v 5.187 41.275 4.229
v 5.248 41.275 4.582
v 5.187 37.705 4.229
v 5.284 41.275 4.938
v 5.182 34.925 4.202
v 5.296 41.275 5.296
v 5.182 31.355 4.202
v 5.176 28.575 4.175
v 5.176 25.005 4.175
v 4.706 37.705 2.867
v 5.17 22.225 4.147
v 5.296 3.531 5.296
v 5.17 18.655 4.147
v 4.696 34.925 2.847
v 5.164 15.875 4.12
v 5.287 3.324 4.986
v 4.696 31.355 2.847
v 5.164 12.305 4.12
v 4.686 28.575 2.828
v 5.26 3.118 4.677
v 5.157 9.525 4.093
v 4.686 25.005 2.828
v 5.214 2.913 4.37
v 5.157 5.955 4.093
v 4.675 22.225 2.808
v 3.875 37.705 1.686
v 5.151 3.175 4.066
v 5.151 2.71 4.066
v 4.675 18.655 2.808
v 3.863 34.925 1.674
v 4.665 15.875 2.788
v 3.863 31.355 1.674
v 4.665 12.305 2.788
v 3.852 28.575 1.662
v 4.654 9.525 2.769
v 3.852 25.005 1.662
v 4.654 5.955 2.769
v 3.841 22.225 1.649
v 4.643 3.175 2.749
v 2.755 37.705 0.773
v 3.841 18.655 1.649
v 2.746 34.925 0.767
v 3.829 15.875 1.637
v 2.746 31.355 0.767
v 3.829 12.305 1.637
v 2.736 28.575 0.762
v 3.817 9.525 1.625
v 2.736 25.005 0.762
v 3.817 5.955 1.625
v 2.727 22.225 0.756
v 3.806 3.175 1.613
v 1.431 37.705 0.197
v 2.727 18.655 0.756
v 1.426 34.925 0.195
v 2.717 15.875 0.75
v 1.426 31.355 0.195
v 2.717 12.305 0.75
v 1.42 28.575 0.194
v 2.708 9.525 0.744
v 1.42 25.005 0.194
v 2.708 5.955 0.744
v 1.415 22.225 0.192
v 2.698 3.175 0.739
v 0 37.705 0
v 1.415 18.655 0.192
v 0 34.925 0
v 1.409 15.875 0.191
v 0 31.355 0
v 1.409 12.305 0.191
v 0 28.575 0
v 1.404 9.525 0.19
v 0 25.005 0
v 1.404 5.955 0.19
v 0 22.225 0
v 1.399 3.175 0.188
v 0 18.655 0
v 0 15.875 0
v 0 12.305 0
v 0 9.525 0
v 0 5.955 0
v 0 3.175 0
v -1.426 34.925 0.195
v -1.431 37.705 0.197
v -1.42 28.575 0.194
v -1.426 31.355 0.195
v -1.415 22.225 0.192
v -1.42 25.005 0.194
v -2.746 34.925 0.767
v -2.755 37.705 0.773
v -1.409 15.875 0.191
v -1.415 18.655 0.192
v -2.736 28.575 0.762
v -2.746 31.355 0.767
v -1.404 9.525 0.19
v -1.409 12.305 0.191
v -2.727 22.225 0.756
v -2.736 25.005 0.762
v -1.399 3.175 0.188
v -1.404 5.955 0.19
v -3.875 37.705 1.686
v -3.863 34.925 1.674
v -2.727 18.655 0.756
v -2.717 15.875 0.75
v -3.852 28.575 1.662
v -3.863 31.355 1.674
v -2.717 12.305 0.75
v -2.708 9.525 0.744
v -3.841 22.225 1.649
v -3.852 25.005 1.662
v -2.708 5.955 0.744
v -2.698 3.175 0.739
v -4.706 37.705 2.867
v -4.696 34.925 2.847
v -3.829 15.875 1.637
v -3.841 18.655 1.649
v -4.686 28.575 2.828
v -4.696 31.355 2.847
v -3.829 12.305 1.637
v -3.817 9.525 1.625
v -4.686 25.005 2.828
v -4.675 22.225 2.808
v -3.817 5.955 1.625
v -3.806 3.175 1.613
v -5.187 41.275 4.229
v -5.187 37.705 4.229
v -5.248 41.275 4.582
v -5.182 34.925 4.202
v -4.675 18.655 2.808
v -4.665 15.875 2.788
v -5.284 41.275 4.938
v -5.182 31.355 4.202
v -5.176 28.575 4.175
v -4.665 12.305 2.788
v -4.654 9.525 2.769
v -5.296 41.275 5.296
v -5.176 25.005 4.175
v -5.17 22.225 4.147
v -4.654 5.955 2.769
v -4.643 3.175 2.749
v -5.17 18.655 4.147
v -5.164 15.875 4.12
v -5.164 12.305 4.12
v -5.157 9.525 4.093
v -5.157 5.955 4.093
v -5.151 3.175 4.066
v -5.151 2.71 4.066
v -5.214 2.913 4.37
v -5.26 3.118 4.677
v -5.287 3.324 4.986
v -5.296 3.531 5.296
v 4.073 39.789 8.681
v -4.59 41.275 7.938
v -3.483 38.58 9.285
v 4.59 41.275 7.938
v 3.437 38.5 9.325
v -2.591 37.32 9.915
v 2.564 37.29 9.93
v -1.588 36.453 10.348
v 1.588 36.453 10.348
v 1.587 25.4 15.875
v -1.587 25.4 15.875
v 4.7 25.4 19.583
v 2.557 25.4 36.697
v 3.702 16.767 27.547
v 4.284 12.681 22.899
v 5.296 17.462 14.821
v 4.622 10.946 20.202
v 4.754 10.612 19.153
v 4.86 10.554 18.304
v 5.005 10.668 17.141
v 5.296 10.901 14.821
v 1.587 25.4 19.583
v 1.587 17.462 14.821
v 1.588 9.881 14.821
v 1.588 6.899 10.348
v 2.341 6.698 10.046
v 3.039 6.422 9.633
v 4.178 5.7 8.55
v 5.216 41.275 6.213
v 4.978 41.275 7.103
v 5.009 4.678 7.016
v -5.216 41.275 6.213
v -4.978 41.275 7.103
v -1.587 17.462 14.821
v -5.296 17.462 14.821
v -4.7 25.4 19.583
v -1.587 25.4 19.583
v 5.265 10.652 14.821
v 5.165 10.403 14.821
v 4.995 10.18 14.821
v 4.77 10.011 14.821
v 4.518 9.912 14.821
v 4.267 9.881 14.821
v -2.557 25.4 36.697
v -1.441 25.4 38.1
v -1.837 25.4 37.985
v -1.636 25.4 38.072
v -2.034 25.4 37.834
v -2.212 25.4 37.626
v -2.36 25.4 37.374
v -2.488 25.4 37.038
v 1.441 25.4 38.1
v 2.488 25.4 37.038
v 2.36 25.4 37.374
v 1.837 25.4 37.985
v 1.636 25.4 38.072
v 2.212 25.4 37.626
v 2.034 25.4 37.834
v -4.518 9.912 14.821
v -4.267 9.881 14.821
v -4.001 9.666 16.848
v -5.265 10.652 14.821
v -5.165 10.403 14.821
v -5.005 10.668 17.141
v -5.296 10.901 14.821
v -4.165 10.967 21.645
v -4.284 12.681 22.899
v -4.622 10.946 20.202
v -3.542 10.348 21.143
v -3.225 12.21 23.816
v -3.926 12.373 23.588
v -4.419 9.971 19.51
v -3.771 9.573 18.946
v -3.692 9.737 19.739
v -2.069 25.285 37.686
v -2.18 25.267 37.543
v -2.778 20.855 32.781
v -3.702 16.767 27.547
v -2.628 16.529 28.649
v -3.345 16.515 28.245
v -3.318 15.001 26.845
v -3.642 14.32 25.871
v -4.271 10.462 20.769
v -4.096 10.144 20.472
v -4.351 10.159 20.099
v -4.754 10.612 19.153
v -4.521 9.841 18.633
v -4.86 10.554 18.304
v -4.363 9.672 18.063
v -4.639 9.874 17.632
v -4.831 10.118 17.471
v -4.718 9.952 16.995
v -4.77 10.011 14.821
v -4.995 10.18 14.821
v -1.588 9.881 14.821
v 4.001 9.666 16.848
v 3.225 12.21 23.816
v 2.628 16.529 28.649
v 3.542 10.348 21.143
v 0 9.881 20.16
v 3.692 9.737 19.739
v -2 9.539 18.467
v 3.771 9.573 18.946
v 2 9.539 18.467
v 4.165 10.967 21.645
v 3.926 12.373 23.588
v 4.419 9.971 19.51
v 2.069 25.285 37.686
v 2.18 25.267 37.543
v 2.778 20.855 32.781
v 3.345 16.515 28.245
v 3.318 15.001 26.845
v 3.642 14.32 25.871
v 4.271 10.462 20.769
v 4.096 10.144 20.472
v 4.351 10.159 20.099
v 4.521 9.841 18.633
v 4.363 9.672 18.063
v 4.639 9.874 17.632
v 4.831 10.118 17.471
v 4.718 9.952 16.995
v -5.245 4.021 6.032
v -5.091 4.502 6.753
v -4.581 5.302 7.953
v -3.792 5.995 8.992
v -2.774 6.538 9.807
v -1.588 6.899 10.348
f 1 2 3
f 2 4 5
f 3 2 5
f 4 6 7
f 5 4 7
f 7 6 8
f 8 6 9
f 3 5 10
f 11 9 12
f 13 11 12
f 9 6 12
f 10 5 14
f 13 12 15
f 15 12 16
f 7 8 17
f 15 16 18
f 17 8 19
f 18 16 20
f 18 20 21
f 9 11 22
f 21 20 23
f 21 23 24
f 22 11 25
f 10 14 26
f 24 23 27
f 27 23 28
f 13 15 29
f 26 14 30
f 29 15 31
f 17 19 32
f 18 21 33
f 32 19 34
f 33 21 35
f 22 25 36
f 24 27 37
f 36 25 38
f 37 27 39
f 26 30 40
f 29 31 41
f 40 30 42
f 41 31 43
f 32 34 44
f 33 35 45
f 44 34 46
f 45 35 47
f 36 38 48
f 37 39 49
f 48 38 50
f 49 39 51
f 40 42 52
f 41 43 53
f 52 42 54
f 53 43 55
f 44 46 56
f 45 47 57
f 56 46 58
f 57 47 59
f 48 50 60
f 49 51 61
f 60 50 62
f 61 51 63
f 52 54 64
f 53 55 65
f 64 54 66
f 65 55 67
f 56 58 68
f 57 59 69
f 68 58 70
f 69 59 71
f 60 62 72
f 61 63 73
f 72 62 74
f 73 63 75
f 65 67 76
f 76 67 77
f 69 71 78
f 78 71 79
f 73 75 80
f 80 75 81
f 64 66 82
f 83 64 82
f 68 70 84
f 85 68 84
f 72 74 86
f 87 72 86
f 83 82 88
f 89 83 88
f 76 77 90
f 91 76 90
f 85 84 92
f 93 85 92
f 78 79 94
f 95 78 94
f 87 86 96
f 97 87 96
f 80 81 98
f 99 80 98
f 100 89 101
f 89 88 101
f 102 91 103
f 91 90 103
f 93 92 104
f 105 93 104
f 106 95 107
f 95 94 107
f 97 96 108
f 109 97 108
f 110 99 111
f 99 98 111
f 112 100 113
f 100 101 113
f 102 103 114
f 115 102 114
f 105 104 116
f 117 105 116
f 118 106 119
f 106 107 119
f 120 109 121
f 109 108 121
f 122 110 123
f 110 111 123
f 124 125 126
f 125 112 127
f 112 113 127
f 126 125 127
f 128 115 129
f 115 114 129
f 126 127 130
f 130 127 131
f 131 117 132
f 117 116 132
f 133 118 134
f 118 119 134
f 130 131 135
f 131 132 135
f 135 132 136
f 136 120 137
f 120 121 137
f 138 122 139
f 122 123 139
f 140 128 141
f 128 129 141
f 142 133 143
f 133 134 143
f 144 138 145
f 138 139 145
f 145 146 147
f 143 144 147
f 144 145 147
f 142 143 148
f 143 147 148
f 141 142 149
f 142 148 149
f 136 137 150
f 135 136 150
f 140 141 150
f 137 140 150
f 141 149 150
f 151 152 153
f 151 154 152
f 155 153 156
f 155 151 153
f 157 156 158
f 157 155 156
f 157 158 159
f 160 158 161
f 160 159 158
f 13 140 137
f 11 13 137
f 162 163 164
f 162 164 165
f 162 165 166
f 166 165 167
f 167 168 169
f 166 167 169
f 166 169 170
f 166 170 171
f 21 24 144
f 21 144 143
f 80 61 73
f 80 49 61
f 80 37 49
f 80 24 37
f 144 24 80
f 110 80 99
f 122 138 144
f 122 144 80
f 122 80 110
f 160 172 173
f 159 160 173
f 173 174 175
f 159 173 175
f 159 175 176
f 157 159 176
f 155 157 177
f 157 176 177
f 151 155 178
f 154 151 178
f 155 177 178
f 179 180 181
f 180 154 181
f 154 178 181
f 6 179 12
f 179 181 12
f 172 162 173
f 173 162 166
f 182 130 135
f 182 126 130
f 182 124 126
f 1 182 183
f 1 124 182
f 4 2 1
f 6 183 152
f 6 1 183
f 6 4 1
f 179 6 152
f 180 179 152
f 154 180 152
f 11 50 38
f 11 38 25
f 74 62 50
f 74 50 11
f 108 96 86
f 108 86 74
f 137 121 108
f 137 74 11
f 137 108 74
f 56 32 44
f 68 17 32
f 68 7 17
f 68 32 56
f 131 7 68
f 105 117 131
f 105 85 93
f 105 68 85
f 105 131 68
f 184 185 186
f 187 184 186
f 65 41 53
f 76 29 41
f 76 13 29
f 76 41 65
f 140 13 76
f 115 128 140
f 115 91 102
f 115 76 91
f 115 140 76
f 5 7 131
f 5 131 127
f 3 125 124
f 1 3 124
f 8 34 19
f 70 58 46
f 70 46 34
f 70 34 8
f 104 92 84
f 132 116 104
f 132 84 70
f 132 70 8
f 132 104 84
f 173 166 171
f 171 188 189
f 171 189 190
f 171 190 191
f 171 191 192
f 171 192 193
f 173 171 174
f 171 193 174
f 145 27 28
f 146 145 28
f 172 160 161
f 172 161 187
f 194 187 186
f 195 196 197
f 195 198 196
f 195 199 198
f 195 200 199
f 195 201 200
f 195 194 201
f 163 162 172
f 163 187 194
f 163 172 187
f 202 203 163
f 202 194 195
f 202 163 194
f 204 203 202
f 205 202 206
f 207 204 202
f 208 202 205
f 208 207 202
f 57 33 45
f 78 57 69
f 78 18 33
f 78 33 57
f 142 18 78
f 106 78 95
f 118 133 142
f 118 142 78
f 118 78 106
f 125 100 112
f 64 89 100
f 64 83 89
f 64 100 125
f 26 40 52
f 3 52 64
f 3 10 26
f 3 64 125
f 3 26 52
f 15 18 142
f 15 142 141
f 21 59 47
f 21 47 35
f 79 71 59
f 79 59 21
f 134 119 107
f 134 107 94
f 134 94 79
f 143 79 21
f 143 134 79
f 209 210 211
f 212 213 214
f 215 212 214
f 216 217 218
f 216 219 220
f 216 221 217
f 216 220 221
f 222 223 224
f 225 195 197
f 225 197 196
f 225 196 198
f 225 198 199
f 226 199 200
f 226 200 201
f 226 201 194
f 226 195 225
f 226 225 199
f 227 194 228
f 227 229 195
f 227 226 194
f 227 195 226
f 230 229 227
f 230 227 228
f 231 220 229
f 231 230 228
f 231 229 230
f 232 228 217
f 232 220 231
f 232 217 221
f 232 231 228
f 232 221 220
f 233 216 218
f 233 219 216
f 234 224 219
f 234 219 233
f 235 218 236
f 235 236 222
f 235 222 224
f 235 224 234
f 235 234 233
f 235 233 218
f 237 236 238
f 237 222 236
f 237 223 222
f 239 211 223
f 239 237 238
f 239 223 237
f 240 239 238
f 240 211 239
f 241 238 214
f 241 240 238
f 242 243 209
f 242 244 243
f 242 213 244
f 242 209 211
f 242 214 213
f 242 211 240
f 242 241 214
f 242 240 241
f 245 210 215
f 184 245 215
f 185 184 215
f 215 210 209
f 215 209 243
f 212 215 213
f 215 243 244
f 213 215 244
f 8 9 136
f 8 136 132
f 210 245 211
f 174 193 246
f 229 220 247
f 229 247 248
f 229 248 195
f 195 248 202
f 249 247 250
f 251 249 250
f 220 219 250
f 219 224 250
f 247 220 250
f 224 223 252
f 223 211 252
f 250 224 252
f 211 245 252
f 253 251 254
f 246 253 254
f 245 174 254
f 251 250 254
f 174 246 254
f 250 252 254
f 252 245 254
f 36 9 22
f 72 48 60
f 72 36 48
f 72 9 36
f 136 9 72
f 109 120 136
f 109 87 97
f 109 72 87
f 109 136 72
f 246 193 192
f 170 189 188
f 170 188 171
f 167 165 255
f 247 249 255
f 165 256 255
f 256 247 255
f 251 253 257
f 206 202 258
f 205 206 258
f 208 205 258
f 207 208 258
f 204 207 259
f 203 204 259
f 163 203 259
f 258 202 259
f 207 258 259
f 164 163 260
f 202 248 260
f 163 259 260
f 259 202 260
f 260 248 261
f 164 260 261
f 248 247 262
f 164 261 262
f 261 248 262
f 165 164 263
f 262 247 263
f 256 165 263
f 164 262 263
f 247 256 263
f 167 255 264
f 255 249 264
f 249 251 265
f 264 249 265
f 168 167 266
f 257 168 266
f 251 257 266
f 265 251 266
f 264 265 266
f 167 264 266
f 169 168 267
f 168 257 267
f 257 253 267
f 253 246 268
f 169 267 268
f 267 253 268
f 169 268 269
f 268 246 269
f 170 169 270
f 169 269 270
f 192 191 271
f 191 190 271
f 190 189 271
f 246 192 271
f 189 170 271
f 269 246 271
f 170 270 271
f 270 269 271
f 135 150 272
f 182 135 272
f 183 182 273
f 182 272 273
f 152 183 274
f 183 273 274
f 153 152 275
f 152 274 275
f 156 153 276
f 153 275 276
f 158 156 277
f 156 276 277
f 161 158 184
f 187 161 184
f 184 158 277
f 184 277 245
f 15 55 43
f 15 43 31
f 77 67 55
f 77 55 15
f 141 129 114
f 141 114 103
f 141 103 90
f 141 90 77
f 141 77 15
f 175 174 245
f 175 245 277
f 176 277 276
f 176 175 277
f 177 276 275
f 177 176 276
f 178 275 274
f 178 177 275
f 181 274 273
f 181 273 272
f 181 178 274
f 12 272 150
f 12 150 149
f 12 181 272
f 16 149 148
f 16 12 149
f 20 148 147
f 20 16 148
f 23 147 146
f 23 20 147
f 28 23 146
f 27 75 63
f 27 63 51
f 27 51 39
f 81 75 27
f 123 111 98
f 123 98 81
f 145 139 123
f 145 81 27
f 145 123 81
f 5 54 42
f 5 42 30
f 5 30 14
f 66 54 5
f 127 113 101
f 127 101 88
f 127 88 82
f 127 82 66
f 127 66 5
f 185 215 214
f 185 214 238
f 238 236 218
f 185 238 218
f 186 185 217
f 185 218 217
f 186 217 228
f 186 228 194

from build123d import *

# Parameters (mm, degrees)
F1_DEPTH  = 5.2959
F2_DEPTH  = 41.276
F4_DEPTH  = 3.7084
F12_DEPTH = 3.7084
F6_DEPTH  = 10.5918
F7_DEPTH  = 41.276
F8_W      = 3.5700032353
F8_H      = 0.1361034085
F8_H_2    = 4.0928895229
F8_H_3    = 0.1088827268
F8_H_4    = 4.1201102046
F8_H_5    = 0.0816620451
F8_H_6    = 4.1473308863
F8_H_7    = 0.0544413634
F8_H_8    = 4.174551568
F8_H_9    = 0.0272206817
F8_H_10   = 4.2017722497
F8_H_11   = 4.2289929314
F14_DEPTH = 12.7
F9_R      = 1.016


with BuildPart() as f1:
    # F0 (on Right) → F1 (new body, symmetric)
    with BuildSketch(Plane.YZ):
        Polygon((25.4, 38.1), (0, 0), (41.275, 0), (41.275, 7.9375), (25.4, 15.875), align=None)
    extrude(amount=F1_DEPTH, both=True)

    # F10 (on Front) → F2 (cut, through all)
    with BuildSketch(Plane.XZ):
        with BuildLine():
            Line((-1.5875, 14.8209), (-5.2959, 14.8209))
            Line((-5.2959, 14.8209), (-5.2959, 5.2959000144))
            ThreePointArc((-5.2959, 5.2959000144), (-4.2692972482, 8.4295333251), (-1.5875, 10.3482658379))
            Line((-1.5875, 10.3482658379), (-1.5875, 14.8209))
        make_face()
        with BuildLine():
            Line((5.2959, 5.2959), (5.2959, 14.8209))
            Line((5.2959, 14.8209), (1.5875, 14.8209))
            Line((1.5875, 14.8209), (1.5875, 10.3482658379))
            ThreePointArc((1.5875, 10.3482658379), (4.2692972525, 8.4295333193), (5.2959, 5.2959))
        make_face()
        with BuildLine():
            ThreePointArc((0, 0), (-3.7447668076, 1.5511332026), (-5.2959, 5.2959000144))
            Line((-5.2959, 5.2959000144), (-5.2959, 0))
            Line((-5.2959, 0), (0, 0))
        make_face()
        with BuildLine():
            ThreePointArc((5.2959, 5.2959), (3.7447668025, 1.5511331975), (0, 0))
            Line((0, 0), (5.2959, 0))
            Line((5.2959, 0), (5.2959, 5.2959))
        make_face()
    extrude(amount=-F2_DEPTH, mode=Mode.SUBTRACT)

    # F3 (on face) → F4 (cut)
    with BuildSketch(Plane.YZ.offset(5.2959)):
        Polygon((17.4625, 14.8209), (27.5082, 14.8209), (25.4, 15.875), (25.4, 19.5834), align=None)
    extrude(amount=-F4_DEPTH, mode=Mode.SUBTRACT)

    # F11 (on face) → F12 (cut)
    with BuildSketch(Plane(origin=(-5.2959, 0, 0), x_dir=(0, -1, 0), z_dir=(-1, 0, 0))):
        Polygon((-27.5082, 14.8209), (-17.4625, 14.8209), (-25.4, 19.5834), (-25.4, 15.875), align=None)
    extrude(amount=-F12_DEPTH, mode=Mode.SUBTRACT)

    # F5 (on face) → F6 (join)
    with BuildSketch(Plane.YZ.offset(5.2959)):
        with BuildLine():
            add(Edge.make_bspline(
                [(9.8806, 14.8209), (9.7887178245, 17.0000575052), (7.8190504565, 20.9662638554), (18.9792610557, 30.802658642), (25.4, 38.1)],
                knots=[0, 0, 0, 0, 0.3217761524, 1, 1, 1, 1], degree=3))
            Line((9.8806, 14.8209), (25.4, 38.1))
        make_face()
    extrude(amount=-F6_DEPTH)

    # F13 (on Front) → F7 (cut, through all)
    with BuildSketch(Plane.XZ):
        with BuildLine():
            add(Edge.make_bspline(
                [(-5.2959, 14.8209), (-5.2959, 15.5472858351), (-5.2959, 17.5957404535), (-5.2959, 22.9229933342), (-5.2959, 29.9563074991), (-5.2959, 35.6675528807), (-5.2959, 38.1)],
                knots=[0, 0, 0, 0, 2.1791575052, 6.1453638554, 15.981758642, 23.2791, 23.2791, 23.2791, 23.2791], degree=3))
            Line((-5.2959, 14.8209), (-2.38125, 38.1))
            Line((-2.38125, 38.1), (-5.2959, 38.1))
        make_face()
        with BuildLine():
            Line((2.38125, 38.1), (5.2959, 14.8209))
            add(Edge.make_bspline(
                [(5.2959, 14.8209), (5.2959, 15.5472858351), (5.2959, 17.5957404535), (5.2959, 22.9229933342), (5.2959, 29.9563074991), (5.2959, 35.6675528807), (5.2959, 38.1)],
                knots=[0, 0, 0, 0, 2.1791575052, 6.1453638554, 15.981758642, 23.2791, 23.2791, 23.2791, 23.2791], degree=3))
            Line((5.2959, 38.1), (2.38125, 38.1))
        make_face()
    extrude(amount=-F7_DEPTH, mode=Mode.SUBTRACT)

    # F8 (on Right) → F14 (cut, symmetric)
    with BuildSketch(Plane.YZ):
        Polygon((3.1753500641, -0.1633240902), (3.1753500641, 0), (3.1753500641, 4.0656688412), (-0.3946531713, 4.0656688412), (-0.3946531713, -0.1633240902), align=None)
        with Locations((7.7402901024, -0.0680517042)):
            Rectangle(F8_W, F8_H)
        with Locations((7.7402901024, 2.0464447615)):
            Rectangle(F8_W, F8_H_2)
        with Locations((14.0902317584, -0.0544413634)):
            Rectangle(F8_W, F8_H_3)
        with Locations((14.0902317584, 2.0600551023)):
            Rectangle(F8_W, F8_H_4)
        with Locations((20.4401734144, -0.0408310225)):
            Rectangle(F8_W, F8_H_5)
        with Locations((20.4401734144, 2.0736654432)):
            Rectangle(F8_W, F8_H_6)
        with Locations((26.7901150703, -0.0272206817)):
            Rectangle(F8_W, F8_H_7)
        with Locations((26.7901150703, 2.087275784)):
            Rectangle(F8_W, F8_H_8)
        with Locations((33.1400567263, -0.0136103408)):
            Rectangle(F8_W, F8_H_9)
        with Locations((33.1400567263, 2.1008861249)):
            Rectangle(F8_W, F8_H_10)
        with Locations((39.4899983823, 2.1144964657)):
            Rectangle(F8_W, F8_H_11)
    extrude(amount=F14_DEPTH, both=True, mode=Mode.SUBTRACT)

    # F9
    f9_edges = [f1.edges().sort_by_distance(p)[0] for p in [
        (3.714975, 15.399413, 27.447632),
        (-3.714975, 15.399413, 27.447632),
    ]]
    fillet(f9_edges, radius=F9_R)


solid = f1.part
